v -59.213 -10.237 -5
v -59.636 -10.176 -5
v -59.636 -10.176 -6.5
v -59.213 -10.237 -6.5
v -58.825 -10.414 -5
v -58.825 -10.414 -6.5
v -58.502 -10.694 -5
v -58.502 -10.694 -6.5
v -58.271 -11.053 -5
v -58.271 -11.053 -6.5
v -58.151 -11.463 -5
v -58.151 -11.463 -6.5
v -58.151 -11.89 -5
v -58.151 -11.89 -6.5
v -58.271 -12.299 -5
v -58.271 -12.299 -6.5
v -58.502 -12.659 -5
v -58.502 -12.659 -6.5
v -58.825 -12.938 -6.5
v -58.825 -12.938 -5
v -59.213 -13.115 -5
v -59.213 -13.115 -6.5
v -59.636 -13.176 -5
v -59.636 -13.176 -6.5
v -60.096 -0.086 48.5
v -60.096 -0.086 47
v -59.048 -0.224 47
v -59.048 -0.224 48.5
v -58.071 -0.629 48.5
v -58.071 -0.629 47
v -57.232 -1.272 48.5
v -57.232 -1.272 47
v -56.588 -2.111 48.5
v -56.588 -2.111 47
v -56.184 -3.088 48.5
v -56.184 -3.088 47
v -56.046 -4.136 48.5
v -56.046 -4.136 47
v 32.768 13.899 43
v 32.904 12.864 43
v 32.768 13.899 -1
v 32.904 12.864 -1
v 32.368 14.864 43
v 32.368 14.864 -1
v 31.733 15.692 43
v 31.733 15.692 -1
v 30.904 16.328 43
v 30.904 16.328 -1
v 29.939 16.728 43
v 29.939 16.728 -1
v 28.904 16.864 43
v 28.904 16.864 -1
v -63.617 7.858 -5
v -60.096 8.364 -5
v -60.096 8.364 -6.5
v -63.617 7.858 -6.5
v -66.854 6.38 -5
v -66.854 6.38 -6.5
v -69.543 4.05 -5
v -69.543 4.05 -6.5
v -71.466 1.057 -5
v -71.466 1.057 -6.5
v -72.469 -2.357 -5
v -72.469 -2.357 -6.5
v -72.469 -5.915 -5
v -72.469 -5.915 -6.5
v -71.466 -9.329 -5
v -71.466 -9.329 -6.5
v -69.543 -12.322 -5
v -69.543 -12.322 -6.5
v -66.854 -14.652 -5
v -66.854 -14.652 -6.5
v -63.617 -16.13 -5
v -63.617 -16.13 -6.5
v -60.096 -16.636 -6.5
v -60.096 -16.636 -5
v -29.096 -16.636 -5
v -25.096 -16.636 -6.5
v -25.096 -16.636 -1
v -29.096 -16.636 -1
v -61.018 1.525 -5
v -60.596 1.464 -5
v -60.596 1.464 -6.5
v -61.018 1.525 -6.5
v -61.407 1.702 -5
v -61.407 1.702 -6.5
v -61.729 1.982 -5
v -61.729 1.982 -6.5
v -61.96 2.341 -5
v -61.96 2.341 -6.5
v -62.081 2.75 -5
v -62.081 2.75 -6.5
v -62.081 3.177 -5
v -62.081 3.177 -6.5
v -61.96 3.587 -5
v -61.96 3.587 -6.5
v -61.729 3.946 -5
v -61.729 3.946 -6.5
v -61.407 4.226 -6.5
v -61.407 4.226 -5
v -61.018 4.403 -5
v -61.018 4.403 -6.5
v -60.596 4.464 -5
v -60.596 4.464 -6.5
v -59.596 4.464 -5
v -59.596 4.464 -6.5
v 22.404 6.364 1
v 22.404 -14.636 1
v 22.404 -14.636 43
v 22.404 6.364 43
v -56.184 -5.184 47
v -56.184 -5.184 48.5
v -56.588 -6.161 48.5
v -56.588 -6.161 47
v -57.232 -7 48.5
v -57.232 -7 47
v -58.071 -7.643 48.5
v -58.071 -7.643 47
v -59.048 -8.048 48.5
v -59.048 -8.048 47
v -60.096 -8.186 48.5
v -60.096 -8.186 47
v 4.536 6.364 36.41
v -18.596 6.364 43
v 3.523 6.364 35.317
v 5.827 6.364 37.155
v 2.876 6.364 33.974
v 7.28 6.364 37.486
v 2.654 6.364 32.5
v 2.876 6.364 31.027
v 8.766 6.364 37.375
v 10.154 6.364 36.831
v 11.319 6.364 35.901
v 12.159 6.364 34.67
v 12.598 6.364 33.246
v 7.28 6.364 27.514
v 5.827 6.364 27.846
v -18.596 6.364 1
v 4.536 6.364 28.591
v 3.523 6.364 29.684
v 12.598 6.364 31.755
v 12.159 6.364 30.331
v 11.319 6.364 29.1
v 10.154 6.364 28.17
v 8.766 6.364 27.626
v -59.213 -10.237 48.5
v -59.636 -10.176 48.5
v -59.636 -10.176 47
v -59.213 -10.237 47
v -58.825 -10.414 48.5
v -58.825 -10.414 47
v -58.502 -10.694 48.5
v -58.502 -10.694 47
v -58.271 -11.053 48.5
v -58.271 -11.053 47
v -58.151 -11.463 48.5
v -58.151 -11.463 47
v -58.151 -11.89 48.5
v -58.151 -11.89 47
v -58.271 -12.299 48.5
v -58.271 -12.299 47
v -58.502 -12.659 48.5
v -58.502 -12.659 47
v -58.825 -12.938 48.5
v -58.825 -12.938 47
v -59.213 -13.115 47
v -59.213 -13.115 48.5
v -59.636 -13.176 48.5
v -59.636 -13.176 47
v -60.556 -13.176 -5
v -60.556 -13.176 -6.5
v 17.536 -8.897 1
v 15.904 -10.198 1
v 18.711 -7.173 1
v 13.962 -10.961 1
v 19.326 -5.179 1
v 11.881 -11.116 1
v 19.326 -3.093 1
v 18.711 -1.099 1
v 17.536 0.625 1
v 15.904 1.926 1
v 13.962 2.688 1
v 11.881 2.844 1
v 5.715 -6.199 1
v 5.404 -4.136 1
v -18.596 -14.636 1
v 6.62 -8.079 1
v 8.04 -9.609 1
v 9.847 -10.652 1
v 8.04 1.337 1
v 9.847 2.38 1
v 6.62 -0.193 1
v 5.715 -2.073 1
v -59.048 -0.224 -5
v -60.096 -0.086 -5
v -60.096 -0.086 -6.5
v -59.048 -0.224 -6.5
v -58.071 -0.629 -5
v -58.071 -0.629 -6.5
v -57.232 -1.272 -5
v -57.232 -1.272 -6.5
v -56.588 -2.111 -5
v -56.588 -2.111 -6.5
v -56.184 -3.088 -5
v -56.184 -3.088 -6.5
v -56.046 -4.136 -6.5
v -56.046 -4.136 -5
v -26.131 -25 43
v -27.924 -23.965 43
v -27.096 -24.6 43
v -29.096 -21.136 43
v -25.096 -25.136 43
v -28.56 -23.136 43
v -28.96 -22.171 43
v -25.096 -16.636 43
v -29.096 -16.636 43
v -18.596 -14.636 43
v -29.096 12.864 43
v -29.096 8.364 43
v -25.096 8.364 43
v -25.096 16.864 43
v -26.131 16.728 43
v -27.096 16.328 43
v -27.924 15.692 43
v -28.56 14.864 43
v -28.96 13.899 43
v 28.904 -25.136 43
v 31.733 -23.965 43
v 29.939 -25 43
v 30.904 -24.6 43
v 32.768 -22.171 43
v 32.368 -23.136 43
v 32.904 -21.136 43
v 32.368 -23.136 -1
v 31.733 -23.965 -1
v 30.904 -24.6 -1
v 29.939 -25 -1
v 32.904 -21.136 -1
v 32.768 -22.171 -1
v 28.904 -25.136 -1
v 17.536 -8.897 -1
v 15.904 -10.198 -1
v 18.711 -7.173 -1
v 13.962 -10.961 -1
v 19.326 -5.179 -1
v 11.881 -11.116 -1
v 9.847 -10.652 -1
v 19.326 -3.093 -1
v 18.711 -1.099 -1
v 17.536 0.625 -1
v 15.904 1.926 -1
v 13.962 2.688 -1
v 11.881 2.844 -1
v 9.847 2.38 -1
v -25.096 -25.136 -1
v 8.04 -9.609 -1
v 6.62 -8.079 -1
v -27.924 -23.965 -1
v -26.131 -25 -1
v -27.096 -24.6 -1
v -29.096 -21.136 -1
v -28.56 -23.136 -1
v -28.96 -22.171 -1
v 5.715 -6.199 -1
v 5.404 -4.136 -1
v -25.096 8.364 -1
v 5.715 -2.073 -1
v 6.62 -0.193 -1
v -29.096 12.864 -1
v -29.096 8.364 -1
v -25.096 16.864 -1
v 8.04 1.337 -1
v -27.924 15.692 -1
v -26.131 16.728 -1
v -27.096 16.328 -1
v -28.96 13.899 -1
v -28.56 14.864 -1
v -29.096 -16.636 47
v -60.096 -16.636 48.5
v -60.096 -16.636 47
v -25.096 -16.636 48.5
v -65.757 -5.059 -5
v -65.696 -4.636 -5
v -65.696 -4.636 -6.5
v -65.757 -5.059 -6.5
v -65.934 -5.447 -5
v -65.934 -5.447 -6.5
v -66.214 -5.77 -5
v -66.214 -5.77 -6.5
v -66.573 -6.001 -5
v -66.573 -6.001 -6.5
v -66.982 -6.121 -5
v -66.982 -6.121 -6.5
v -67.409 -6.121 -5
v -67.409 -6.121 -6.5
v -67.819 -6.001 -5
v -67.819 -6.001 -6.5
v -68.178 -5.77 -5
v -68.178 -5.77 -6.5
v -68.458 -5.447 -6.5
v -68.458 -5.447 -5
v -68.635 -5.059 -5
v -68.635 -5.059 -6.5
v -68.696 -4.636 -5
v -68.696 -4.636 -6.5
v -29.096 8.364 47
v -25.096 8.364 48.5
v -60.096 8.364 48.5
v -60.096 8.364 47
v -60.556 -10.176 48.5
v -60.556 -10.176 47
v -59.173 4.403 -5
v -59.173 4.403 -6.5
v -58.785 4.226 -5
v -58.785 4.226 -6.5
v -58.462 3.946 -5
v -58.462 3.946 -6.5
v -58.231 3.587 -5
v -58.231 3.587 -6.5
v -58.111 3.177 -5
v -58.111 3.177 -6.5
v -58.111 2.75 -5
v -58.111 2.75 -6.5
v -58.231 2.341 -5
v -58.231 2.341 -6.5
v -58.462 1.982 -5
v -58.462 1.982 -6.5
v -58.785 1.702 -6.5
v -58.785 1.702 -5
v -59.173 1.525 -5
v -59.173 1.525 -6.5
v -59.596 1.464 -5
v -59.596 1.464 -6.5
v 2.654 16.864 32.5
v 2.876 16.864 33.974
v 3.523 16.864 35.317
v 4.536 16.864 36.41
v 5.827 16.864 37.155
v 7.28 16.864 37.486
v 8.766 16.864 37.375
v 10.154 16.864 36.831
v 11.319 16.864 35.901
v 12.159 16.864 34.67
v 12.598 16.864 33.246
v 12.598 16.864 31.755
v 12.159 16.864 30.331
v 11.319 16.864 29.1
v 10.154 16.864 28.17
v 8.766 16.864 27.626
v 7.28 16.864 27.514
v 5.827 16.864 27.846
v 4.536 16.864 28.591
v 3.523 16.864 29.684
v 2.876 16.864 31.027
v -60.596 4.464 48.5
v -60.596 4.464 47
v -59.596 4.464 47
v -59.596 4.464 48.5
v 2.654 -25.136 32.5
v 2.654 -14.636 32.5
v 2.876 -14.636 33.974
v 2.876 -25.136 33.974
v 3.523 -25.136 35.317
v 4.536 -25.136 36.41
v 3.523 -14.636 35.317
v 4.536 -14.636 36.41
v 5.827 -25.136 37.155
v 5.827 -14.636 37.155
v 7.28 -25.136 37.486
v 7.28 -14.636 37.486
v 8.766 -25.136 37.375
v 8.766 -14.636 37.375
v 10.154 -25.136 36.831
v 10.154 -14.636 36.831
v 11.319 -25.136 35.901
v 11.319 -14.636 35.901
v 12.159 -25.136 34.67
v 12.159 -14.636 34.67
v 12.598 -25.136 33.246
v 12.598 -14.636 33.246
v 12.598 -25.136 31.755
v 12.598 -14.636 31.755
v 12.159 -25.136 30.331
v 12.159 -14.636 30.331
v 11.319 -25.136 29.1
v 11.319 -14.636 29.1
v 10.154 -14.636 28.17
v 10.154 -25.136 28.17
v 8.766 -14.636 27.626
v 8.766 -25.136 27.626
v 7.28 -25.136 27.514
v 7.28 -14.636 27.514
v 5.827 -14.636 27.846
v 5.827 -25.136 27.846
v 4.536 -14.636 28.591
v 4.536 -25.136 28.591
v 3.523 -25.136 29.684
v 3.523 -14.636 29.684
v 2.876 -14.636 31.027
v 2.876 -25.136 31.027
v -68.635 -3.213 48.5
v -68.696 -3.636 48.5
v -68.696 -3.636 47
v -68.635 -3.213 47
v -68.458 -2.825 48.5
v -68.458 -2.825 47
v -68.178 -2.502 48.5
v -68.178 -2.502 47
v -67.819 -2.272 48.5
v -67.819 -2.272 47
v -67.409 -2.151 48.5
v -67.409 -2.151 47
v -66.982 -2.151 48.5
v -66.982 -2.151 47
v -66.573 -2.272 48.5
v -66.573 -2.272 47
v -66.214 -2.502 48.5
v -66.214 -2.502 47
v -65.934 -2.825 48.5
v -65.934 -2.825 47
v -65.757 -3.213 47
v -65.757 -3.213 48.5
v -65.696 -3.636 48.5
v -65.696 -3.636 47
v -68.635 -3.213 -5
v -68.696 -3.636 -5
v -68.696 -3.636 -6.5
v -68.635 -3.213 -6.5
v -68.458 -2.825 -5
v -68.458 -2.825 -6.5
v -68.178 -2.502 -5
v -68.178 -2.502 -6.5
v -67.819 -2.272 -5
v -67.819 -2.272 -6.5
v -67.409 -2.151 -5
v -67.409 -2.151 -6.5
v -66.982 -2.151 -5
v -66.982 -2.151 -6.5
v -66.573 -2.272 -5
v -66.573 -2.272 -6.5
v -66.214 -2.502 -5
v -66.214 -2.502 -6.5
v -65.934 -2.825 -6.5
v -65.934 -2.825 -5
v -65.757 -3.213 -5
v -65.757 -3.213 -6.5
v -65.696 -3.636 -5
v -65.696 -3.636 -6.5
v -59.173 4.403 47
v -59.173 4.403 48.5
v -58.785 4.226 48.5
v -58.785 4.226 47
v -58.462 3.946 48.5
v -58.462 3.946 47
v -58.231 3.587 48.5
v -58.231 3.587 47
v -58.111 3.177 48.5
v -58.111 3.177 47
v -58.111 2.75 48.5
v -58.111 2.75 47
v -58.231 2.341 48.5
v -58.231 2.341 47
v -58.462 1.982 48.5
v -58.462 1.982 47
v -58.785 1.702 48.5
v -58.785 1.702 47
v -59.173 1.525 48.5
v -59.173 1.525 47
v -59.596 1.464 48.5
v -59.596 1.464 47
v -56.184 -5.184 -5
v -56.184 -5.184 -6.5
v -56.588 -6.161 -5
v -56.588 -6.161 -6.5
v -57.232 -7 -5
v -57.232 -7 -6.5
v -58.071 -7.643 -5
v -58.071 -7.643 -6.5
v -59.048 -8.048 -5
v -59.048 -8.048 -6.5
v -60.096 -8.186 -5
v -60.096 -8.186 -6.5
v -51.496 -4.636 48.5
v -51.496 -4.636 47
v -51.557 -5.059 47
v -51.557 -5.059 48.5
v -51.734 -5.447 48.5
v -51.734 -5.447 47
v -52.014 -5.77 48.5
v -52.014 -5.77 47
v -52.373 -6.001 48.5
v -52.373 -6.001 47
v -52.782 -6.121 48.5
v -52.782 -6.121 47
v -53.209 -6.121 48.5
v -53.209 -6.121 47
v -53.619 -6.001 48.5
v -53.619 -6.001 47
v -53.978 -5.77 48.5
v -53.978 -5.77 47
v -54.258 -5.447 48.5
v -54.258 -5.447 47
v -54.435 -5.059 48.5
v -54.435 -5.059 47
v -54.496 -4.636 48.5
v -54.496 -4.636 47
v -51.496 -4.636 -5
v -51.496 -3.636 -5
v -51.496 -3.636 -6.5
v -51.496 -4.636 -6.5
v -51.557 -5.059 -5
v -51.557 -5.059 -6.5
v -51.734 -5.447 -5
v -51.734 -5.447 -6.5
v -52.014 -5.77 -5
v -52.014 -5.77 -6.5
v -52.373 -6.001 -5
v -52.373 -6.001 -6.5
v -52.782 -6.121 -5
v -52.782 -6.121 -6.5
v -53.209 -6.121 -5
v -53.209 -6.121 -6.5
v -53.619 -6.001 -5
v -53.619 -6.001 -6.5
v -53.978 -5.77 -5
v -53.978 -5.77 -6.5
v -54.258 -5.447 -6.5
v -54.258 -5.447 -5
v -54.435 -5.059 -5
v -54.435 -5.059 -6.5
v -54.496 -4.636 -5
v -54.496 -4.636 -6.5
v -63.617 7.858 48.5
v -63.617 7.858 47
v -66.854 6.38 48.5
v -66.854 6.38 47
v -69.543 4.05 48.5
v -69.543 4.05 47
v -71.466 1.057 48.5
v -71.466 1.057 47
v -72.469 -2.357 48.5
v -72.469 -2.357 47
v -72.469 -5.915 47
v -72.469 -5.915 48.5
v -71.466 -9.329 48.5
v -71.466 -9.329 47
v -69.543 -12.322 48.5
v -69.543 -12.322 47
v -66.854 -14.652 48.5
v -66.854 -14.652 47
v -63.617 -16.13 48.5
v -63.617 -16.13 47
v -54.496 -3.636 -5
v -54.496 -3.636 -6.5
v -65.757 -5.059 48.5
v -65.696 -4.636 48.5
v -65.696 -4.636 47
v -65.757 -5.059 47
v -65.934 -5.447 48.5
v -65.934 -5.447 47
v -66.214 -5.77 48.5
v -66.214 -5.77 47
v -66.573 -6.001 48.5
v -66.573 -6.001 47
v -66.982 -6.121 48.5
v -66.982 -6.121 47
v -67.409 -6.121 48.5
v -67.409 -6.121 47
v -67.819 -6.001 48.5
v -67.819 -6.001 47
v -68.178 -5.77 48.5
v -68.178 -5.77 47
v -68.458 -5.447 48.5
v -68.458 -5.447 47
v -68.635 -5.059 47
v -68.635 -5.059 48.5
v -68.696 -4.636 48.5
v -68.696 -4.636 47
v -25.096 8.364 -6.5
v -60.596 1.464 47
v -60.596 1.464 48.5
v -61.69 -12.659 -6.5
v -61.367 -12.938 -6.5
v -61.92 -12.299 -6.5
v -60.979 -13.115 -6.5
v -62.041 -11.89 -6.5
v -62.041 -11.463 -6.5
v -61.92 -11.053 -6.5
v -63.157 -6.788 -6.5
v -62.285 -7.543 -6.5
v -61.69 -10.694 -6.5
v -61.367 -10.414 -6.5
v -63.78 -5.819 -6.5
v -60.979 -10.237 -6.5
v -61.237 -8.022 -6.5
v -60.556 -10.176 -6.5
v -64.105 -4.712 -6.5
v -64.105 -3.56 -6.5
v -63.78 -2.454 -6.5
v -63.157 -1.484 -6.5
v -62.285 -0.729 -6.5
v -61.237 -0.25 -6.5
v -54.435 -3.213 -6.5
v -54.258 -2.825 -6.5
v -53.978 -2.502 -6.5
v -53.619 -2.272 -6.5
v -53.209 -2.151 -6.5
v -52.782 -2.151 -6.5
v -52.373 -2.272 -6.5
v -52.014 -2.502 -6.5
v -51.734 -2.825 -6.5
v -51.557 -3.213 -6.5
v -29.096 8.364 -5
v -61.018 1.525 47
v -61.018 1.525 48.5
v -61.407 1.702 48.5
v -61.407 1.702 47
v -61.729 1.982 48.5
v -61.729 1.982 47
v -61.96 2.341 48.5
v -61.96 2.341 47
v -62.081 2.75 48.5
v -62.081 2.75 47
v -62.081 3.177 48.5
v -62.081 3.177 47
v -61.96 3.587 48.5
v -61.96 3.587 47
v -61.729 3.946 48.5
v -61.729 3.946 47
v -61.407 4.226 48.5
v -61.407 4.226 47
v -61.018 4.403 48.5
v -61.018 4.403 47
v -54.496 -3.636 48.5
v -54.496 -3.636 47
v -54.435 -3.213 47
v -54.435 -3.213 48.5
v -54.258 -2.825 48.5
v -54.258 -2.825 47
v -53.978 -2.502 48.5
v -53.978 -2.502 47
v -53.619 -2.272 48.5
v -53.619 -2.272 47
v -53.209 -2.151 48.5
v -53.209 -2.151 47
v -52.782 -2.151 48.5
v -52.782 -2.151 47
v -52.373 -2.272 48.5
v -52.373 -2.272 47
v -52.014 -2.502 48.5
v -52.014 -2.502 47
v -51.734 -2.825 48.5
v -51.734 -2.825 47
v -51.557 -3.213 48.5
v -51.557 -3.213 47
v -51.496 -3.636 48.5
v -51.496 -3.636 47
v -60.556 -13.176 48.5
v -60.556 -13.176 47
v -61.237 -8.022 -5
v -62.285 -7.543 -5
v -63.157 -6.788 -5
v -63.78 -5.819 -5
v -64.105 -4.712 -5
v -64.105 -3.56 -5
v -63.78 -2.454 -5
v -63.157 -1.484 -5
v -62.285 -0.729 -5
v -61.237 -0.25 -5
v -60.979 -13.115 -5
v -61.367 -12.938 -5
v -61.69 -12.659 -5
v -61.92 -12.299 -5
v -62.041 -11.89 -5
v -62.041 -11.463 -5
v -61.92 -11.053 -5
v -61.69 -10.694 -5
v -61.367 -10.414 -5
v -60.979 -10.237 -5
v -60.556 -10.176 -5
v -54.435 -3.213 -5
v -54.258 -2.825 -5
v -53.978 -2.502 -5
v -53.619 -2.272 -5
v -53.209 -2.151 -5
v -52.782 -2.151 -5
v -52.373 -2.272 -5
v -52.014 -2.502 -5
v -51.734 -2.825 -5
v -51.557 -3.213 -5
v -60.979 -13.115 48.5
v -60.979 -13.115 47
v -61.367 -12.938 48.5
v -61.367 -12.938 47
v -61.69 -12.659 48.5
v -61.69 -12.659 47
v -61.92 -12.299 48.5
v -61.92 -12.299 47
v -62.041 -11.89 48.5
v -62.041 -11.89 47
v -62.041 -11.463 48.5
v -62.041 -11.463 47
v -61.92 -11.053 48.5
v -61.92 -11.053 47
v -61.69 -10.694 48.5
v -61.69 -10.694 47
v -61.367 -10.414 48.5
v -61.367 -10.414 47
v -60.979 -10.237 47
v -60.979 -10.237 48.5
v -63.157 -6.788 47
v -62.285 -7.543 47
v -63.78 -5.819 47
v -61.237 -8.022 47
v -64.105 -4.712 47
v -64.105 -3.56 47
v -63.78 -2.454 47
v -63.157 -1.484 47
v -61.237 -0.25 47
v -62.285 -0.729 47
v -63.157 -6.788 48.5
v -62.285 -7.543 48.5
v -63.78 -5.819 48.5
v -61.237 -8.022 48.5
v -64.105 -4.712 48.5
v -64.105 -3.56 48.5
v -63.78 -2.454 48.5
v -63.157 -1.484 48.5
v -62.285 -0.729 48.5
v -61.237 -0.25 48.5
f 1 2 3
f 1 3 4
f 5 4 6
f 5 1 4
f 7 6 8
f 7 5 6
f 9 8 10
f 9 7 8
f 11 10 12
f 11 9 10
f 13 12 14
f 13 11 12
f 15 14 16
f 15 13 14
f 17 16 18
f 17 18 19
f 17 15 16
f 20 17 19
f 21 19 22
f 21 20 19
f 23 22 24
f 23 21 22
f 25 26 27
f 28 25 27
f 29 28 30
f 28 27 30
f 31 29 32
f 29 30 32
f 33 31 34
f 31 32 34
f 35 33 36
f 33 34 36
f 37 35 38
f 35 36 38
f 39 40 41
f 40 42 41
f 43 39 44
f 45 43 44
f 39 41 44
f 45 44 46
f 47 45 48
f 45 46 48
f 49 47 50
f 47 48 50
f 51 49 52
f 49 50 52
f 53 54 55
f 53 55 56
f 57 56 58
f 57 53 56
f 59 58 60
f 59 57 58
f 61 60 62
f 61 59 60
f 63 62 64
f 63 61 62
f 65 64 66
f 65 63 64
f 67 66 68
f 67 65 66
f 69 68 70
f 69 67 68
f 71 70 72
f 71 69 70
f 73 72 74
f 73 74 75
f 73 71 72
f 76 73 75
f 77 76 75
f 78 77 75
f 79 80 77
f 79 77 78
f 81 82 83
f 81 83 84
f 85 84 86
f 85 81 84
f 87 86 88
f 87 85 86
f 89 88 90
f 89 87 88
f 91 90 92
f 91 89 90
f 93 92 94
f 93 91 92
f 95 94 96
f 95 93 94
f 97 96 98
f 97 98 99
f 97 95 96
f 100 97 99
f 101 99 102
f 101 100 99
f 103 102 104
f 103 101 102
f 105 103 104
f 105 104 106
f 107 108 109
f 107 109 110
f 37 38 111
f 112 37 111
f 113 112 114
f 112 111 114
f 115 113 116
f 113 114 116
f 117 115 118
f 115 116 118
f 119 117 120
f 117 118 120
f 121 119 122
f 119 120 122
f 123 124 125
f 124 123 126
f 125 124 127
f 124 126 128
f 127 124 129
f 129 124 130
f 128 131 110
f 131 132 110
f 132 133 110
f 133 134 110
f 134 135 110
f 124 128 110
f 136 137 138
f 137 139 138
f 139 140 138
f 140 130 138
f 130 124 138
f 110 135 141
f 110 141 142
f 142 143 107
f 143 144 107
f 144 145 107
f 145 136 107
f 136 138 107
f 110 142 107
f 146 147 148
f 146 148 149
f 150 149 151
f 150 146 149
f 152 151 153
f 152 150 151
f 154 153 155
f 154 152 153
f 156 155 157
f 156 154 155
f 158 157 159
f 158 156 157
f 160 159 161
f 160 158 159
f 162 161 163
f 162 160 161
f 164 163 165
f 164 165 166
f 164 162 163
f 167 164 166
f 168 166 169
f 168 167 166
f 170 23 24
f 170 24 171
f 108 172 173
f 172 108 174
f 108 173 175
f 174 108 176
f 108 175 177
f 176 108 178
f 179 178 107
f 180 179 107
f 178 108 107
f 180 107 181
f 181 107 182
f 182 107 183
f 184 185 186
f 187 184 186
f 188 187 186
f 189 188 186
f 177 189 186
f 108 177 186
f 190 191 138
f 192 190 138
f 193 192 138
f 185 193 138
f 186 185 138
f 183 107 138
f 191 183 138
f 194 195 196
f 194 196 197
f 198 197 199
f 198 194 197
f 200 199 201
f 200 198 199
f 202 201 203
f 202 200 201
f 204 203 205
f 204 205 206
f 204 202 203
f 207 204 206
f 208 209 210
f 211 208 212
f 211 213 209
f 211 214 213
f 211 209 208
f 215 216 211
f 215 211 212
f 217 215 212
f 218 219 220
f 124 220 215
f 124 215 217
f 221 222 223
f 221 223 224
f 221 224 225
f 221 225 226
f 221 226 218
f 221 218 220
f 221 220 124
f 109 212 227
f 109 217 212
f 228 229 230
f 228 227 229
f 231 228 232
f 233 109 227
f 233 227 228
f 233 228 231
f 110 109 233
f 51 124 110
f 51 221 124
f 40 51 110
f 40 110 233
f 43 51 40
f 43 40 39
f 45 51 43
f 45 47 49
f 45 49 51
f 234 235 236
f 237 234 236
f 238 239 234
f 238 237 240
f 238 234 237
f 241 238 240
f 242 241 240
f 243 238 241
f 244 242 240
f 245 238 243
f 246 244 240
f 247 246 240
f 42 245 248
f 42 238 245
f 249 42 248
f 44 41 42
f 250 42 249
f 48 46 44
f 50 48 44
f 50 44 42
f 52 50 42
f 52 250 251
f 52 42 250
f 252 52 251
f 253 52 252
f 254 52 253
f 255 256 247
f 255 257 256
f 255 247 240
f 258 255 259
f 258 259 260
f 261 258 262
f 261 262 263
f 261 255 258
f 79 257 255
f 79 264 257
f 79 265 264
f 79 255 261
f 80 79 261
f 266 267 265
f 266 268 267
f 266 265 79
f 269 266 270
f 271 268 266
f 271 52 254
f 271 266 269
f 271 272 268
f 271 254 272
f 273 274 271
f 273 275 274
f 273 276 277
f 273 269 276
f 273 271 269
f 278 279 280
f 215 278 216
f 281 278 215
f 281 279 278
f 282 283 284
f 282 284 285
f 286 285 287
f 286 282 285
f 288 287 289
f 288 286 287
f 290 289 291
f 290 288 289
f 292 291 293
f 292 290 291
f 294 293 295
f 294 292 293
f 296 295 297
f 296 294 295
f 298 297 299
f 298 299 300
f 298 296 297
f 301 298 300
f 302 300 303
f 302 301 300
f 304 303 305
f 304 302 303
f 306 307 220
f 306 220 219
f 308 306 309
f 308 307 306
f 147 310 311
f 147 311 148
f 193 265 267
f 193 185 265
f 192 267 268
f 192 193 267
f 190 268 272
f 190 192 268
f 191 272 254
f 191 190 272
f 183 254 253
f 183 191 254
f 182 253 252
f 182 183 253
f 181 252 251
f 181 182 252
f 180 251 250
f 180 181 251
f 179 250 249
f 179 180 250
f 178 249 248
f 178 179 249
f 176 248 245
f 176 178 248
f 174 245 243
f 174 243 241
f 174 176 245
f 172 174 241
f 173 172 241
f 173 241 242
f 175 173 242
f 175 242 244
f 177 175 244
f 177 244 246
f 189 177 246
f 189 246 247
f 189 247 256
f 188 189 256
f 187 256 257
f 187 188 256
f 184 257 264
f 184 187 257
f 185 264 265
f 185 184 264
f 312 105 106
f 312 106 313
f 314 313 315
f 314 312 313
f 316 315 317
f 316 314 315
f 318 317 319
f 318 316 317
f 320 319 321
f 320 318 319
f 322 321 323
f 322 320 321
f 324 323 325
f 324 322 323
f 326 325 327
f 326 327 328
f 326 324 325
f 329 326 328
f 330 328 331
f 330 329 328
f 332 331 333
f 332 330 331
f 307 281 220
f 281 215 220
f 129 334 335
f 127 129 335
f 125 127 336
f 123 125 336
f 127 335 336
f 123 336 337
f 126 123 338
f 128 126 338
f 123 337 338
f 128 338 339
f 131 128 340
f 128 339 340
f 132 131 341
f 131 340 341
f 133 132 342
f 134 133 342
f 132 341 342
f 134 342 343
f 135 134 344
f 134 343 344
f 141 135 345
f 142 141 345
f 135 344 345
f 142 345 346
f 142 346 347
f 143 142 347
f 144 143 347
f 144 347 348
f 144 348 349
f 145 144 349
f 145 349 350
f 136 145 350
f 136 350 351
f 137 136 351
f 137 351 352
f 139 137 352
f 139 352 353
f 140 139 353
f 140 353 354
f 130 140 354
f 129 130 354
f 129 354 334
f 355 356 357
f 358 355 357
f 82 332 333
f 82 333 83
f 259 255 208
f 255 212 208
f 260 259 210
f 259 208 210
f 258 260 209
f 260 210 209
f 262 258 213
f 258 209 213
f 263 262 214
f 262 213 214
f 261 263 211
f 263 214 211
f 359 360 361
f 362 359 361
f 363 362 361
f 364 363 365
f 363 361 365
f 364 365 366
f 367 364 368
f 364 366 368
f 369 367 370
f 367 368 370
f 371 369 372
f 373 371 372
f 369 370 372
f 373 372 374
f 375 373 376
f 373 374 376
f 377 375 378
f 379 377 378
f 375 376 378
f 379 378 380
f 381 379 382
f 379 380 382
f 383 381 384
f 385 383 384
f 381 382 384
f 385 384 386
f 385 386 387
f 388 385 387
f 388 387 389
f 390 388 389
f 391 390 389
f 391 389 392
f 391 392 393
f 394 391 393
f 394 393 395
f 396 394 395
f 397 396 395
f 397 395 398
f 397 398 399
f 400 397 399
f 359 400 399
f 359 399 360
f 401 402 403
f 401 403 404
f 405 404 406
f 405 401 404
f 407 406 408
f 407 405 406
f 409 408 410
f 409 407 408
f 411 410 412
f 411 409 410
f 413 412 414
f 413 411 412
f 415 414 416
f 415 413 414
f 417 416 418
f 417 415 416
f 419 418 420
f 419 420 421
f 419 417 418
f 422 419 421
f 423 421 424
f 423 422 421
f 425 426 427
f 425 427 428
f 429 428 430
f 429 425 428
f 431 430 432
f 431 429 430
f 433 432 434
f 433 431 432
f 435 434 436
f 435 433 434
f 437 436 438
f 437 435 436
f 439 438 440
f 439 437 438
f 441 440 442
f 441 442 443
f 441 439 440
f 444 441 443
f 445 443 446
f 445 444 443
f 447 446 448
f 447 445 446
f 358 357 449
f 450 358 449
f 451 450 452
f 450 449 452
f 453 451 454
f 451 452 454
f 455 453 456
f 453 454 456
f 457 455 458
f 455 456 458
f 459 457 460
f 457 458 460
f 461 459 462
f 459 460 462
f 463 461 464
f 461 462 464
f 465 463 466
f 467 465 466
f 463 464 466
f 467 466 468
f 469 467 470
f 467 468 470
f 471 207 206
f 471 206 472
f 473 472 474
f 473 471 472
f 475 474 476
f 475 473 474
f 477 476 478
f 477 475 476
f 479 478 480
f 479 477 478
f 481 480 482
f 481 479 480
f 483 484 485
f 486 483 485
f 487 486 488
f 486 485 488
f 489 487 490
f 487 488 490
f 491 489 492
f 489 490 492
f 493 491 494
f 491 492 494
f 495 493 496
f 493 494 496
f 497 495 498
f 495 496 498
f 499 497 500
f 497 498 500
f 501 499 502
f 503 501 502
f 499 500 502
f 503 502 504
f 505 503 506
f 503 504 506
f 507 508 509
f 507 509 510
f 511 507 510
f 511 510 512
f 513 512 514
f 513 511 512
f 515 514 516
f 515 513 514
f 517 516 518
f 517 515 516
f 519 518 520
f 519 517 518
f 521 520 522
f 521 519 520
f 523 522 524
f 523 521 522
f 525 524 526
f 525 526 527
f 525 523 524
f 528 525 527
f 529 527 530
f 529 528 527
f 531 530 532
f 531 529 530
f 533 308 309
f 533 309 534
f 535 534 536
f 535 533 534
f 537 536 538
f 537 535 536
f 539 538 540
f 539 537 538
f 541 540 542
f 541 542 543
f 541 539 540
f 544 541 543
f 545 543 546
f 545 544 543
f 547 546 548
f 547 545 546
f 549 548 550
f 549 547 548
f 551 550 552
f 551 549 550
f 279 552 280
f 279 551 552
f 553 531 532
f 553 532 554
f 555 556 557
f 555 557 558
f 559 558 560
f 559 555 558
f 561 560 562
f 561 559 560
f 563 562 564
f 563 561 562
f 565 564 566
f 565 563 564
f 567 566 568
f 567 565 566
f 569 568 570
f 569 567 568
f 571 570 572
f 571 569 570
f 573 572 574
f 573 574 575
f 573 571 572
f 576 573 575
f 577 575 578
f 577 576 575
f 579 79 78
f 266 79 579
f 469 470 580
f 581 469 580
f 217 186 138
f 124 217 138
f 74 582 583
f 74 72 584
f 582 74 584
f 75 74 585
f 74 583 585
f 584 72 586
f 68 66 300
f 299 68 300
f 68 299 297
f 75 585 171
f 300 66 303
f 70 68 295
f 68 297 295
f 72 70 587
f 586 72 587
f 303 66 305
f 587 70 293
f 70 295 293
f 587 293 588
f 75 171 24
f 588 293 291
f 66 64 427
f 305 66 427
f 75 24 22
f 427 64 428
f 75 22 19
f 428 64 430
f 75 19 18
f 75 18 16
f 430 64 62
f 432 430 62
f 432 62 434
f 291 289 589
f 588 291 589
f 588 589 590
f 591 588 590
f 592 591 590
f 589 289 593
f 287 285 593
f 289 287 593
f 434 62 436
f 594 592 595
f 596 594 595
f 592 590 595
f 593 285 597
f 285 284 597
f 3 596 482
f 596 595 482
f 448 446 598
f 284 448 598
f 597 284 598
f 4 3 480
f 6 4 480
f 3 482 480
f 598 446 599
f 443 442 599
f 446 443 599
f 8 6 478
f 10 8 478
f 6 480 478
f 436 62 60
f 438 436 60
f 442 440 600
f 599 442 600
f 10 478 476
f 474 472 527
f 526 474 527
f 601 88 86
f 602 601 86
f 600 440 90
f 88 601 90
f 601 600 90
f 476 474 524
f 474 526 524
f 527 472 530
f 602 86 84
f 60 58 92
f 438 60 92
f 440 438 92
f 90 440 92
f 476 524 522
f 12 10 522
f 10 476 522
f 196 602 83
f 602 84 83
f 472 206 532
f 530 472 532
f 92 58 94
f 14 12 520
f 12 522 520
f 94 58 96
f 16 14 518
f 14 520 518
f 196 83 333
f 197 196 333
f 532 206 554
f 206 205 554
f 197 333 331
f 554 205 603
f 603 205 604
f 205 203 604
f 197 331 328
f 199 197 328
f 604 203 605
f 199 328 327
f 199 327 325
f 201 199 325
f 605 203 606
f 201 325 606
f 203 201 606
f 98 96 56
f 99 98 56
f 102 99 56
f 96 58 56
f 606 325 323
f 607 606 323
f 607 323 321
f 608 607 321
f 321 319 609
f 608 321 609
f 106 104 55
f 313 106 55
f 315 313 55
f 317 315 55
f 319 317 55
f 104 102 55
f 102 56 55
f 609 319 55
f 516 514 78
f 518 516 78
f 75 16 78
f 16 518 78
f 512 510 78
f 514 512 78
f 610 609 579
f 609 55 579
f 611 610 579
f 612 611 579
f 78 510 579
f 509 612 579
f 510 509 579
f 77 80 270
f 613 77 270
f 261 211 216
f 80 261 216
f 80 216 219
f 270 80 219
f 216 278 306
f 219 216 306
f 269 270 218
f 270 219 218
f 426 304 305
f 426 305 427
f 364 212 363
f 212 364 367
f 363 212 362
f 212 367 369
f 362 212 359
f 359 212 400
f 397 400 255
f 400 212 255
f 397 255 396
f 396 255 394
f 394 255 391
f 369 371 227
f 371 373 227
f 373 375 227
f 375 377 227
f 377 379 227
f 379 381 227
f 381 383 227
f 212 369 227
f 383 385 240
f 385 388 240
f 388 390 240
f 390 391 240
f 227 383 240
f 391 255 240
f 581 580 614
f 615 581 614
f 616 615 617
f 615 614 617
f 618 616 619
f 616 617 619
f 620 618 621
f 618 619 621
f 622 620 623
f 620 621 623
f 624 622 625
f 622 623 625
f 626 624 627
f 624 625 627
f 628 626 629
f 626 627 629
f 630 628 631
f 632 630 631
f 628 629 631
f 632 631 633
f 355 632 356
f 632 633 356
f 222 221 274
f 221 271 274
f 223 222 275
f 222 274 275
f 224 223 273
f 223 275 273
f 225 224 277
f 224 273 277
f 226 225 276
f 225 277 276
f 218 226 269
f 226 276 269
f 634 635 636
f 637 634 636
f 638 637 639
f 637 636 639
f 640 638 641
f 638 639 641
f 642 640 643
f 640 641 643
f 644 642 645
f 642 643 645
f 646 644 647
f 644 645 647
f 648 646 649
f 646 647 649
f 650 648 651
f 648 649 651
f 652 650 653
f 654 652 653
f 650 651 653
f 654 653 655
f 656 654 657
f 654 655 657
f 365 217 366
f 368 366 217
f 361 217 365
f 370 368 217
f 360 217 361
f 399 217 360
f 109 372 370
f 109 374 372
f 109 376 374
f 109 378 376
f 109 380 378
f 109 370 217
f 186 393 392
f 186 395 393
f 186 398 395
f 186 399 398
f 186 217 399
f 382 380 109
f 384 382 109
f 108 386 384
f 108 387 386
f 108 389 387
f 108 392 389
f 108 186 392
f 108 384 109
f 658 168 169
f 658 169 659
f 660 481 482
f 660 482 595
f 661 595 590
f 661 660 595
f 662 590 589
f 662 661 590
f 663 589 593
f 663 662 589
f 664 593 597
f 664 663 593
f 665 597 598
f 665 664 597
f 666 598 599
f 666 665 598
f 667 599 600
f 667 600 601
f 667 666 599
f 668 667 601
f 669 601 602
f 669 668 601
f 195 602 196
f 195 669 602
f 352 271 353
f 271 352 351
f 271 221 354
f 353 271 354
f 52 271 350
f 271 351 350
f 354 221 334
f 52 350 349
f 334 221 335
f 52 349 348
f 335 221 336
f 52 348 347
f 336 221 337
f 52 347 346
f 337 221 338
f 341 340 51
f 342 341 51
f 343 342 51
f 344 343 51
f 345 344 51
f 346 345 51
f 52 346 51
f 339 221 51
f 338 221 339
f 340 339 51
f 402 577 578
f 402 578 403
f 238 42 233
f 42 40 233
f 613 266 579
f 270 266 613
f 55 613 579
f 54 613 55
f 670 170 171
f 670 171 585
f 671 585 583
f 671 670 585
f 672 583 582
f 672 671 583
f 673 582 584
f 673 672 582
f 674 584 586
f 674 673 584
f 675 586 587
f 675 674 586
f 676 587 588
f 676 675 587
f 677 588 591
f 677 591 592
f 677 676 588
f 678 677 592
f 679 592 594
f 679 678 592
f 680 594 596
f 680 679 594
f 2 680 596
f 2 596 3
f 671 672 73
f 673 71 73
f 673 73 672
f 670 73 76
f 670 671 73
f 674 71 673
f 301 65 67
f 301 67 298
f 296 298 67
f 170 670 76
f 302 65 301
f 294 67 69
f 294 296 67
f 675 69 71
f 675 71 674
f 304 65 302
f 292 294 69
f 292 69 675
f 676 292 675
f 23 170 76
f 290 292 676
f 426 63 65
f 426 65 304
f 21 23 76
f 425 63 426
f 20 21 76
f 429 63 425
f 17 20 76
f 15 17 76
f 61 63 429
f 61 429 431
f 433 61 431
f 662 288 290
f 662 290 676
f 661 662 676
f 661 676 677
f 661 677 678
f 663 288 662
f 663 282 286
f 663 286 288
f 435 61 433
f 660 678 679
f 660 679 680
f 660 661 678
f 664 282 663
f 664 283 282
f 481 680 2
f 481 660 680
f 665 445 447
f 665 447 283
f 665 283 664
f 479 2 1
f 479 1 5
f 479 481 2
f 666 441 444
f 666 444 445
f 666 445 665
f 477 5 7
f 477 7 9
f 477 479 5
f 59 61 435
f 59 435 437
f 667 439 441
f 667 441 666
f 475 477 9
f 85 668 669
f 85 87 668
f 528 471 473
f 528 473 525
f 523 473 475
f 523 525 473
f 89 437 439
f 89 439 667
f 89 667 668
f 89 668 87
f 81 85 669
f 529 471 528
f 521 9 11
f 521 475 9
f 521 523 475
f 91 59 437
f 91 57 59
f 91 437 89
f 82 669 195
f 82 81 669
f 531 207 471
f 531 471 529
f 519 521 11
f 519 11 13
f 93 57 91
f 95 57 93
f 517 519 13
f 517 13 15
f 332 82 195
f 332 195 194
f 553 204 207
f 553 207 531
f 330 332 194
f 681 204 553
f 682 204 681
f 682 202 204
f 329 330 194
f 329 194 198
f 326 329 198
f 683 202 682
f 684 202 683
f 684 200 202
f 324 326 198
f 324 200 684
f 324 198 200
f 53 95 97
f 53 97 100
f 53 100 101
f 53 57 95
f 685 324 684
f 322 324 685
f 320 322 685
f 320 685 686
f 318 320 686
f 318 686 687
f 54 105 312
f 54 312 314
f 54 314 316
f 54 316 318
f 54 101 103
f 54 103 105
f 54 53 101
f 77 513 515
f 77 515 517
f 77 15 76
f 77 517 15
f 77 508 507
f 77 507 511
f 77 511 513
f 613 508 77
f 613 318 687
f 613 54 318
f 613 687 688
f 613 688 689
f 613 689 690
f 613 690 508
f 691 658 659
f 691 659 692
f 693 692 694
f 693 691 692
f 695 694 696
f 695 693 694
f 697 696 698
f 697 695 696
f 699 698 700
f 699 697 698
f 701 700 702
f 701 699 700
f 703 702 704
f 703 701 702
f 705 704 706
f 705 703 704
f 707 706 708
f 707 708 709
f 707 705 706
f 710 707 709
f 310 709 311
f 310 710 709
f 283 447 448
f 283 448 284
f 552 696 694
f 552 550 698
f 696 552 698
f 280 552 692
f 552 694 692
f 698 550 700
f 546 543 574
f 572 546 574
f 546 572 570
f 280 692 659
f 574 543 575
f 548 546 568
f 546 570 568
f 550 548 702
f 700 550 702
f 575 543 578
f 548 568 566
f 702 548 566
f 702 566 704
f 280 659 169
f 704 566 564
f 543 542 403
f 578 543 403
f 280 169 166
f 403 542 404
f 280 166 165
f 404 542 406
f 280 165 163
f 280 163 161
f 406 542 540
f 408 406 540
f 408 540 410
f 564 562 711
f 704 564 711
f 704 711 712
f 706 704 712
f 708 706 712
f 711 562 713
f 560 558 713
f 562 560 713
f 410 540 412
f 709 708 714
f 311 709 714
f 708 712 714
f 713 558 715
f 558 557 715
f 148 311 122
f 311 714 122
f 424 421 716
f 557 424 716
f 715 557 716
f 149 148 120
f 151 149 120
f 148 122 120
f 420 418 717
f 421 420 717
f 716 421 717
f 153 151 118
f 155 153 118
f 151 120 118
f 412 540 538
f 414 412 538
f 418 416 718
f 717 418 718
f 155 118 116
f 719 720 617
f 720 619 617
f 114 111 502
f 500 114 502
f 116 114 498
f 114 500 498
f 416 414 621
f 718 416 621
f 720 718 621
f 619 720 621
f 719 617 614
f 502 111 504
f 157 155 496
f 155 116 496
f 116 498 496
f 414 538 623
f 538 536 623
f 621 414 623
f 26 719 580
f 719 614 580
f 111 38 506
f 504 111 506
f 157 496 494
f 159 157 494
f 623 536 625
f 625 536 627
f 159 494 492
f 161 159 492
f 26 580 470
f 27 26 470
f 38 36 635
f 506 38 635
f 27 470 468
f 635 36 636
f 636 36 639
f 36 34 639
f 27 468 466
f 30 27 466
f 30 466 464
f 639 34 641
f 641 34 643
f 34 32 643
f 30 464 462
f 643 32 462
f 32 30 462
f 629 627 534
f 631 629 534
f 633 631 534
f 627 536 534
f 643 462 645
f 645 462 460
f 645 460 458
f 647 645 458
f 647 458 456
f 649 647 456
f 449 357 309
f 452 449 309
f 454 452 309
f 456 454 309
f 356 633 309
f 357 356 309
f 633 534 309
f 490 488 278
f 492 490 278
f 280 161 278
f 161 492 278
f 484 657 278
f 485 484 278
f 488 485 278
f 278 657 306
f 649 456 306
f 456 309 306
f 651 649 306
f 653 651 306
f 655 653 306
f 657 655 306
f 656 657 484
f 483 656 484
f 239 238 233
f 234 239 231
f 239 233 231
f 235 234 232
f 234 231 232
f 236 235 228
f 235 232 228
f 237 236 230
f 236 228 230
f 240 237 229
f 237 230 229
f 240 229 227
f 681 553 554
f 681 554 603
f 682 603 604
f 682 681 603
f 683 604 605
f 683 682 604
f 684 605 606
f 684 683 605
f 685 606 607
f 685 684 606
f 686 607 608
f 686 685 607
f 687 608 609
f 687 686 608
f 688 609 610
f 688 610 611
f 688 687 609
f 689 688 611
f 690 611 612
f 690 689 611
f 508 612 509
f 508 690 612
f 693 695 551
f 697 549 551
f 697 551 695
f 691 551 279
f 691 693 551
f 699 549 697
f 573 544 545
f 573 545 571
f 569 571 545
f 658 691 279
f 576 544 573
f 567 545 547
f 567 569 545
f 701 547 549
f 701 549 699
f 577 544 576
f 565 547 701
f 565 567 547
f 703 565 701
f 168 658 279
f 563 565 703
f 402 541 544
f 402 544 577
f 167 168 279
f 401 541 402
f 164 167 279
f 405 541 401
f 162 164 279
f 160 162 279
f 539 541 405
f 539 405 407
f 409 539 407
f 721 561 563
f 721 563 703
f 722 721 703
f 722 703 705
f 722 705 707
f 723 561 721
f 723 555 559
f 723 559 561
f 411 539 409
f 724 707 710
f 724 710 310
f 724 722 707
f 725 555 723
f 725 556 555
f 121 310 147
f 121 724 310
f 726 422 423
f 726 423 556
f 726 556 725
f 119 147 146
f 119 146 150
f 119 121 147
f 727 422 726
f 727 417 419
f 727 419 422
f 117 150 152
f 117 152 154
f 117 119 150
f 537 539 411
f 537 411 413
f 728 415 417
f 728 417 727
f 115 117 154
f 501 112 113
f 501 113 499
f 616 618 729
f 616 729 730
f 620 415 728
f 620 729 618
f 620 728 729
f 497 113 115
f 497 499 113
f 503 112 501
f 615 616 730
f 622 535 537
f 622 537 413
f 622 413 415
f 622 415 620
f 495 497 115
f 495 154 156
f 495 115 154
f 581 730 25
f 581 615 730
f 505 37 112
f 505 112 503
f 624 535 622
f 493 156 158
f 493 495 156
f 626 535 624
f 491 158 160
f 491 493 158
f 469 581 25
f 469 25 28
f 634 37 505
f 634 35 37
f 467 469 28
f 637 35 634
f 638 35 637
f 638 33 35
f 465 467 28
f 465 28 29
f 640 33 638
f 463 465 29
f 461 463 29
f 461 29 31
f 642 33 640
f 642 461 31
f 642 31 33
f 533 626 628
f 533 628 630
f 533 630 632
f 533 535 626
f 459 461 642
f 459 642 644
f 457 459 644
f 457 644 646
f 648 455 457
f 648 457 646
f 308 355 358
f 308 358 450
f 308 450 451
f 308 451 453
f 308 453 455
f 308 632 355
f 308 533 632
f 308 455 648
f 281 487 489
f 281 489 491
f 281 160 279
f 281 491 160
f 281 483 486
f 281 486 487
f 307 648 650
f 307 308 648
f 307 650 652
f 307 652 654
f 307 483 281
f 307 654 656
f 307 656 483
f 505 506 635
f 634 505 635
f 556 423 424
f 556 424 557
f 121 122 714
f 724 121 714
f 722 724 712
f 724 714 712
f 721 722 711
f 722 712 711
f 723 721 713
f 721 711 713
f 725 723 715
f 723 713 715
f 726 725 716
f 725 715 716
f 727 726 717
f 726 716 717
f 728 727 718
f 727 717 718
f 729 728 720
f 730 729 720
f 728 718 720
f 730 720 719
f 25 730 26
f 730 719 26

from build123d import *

# Parameters (mm, degrees)
SKETCH1_W           = 62
SKETCH1_H           = 42
SKETCH1_W_2         = 41
SKETCH1_H_2         = 21
BOSS_EXTRUDE1_DEPTH = 43
SKETCH2_W           = 4
SKETCH2_H           = 25
BOSS_EXTRUDE2_DEPTH = 4
SKETCH3_W           = 4
SKETCH3_H           = 25
BOSS_EXTRUDE6_DEPTH = 1.5
SKETCH3_8_W         = 4
SKETCH3_8_H         = 25
BOSS_EXTRUDE7_DEPTH = 53.5
CUT_EXTRUDE1_DEPTH  = 52
SKETCH_1_R          = 5
CUT_EXTRUDE_1_DEPTH = 42
EXTRUDE_1_DEPTH     = 1
SKETCH_2_3_R        = 7
EXTRUDE_2_DEPTH     = 1
FILLET_1_R          = 4
FILLET_2_R          = 4
FILLET_3_R          = 4
FILLET_4_R          = 4


with BuildPart() as part:
    # Sketch1 → Boss-Extrude1 (new body)
    with BuildSketch(Plane.XY):
        with Locations((1.904162196, -4.136072895)):
            Rectangle(SKETCH1_W, SKETCH1_H)
        with Locations((1.904162196, -4.136072895)):
            Rectangle(SKETCH1_W_2, SKETCH1_H_2, mode=Mode.SUBTRACT)
    extrude(amount=BOSS_EXTRUDE1_DEPTH)

    # Sketch2 → Boss-Extrude2 (add)
    with BuildSketch(Plane.XY.offset(43)):
        with Locations((-27.095837804, -4.136072895)):
            Rectangle(SKETCH2_W, SKETCH2_H)
    extrude(amount=BOSS_EXTRUDE2_DEPTH)

    # Sketch3 → Boss-Extrude6 (add)
    with BuildSketch(Plane.XY.offset(47)):
        with BuildLine():
            Line((-60.095837804, 4.463927105), (-60.095837804, 8.363927105))
            ThreePointArc((-60.095837804, 8.363927105), (-72.595837804, -4.136072895), (-60.095837804, -16.636072895))
            Line((-60.095837804, -16.636072895), (-60.095837804, -13.176248856))
            Line((-60.095837804, -13.176248856), (-60.555926168, -13.176248856))
            ThreePointArc((-60.555926168, -13.176248856), (-62.055926168, -11.676248856), (-60.555926168, -10.176248856))
            Line((-60.555926168, -10.176248856), (-60.095837804, -10.176248856))
            Line((-60.095837804, -10.176248856), (-60.095837804, -8.186072895))
            ThreePointArc((-60.095837804, -8.186072895), (-64.145837804, -4.136072895), (-60.095837804, -0.086072895))
            Line((-60.095837804, -0.086072895), (-60.095837804, 1.463927105))
            Line((-60.095837804, 1.463927105), (-60.595837804, 1.463927105))
            ThreePointArc((-60.595837804, 1.463927105), (-62.095837804, 2.963927105), (-60.595837804, 4.463927105))
            Line((-60.595837804, 4.463927105), (-60.095837804, 4.463927105))
        make_face()
        with BuildLine():
            ThreePointArc((-68.695837804, -3.636072895), (-67.195837804, -2.136072895), (-65.695837804, -3.636072895))
            Line((-65.695837804, -3.636072895), (-65.695837804, -4.636072895))
            ThreePointArc((-65.695837804, -4.636072895), (-67.195837804, -6.136072895), (-68.695837804, -4.636072895))
            Line((-68.695837804, -4.636072895), (-68.695837804, -3.636072895))
        make_face(mode=Mode.SUBTRACT)
        with BuildLine():
            Line((-29.095837804, -16.636072895), (-29.095837804, 8.363927105))
            Line((-29.095837804, 8.363927105), (-60.095837804, 8.363927105))
            Line((-60.095837804, 8.363927105), (-60.095837804, 4.463927105))
            Line((-60.095837804, 4.463927105), (-59.595837804, 4.463927105))
            ThreePointArc((-59.595837804, 4.463927105), (-58.095837804, 2.963927105), (-59.595837804, 1.463927105))
            Line((-59.595837804, 1.463927105), (-60.095837804, 1.463927105))
            Line((-60.095837804, 1.463927105), (-60.095837804, -0.086072895))
            ThreePointArc((-60.095837804, -0.086072895), (-57.23205534, -1.272290432), (-56.045837804, -4.136072895))
            ThreePointArc((-56.045837804, -4.136072895), (-57.23205534, -6.999855359), (-60.095837804, -8.186072895))
            Line((-60.095837804, -8.186072895), (-60.095837804, -10.176248856))
            Line((-60.095837804, -10.176248856), (-59.635749439, -10.176248856))
            ThreePointArc((-59.635749439, -10.176248856), (-58.135749439, -11.676248856), (-59.635749439, -13.176248856))
            Line((-59.635749439, -13.176248856), (-60.095837804, -13.176248856))
            Line((-60.095837804, -13.176248856), (-60.095837804, -16.636072895))
            Line((-60.095837804, -16.636072895), (-29.095837804, -16.636072895))
        make_face()
        with BuildLine():
            ThreePointArc((-54.495837804, -3.636072895), (-52.995837804, -2.136072895), (-51.495837804, -3.636072895))
            Line((-51.495837804, -3.636072895), (-51.495837804, -4.636072895))
            ThreePointArc((-51.495837804, -4.636072895), (-52.995837804, -6.136072895), (-54.495837804, -4.636072895))
            Line((-54.495837804, -4.636072895), (-54.495837804, -3.636072895))
        make_face(mode=Mode.SUBTRACT)
        with Locations((-27.095837804, -4.136072895)):
            Rectangle(SKETCH3_W, SKETCH3_H)
    extrude(amount=BOSS_EXTRUDE6_DEPTH)

    # Sketch3<8> → Boss-Extrude7 (add)
    with BuildSketch(Plane.XY.offset(47)):
        with BuildLine():
            Line((-60.095837804, 4.463927105), (-60.095837804, 8.363927105))
            ThreePointArc((-60.095837804, 8.363927105), (-72.595837804, -4.136072895), (-60.095837804, -16.636072895))
            Line((-60.095837804, -16.636072895), (-60.095837804, -13.176248856))
            Line((-60.095837804, -13.176248856), (-60.555926168, -13.176248856))
            ThreePointArc((-60.555926168, -13.176248856), (-62.055926168, -11.676248856), (-60.555926168, -10.176248856))
            Line((-60.555926168, -10.176248856), (-60.095837804, -10.176248856))
            Line((-60.095837804, -10.176248856), (-60.095837804, -8.186072895))
            ThreePointArc((-60.095837804, -8.186072895), (-64.145837804, -4.136072895), (-60.095837804, -0.086072895))
            Line((-60.095837804, -0.086072895), (-60.095837804, 1.463927105))
            Line((-60.095837804, 1.463927105), (-60.595837804, 1.463927105))
            ThreePointArc((-60.595837804, 1.463927105), (-62.095837804, 2.963927105), (-60.595837804, 4.463927105))
            Line((-60.595837804, 4.463927105), (-60.095837804, 4.463927105))
        make_face()
        with BuildLine():
            ThreePointArc((-68.695837804, -3.636072895), (-67.195837804, -2.136072895), (-65.695837804, -3.636072895))
            Line((-65.695837804, -3.636072895), (-65.695837804, -4.636072895))
            ThreePointArc((-65.695837804, -4.636072895), (-67.195837804, -6.136072895), (-68.695837804, -4.636072895))
            Line((-68.695837804, -4.636072895), (-68.695837804, -3.636072895))
        make_face(mode=Mode.SUBTRACT)
        with BuildLine():
            Line((-29.095837804, -16.636072895), (-29.095837804, 8.363927105))
            Line((-29.095837804, 8.363927105), (-60.095837804, 8.363927105))
            Line((-60.095837804, 8.363927105), (-60.095837804, 4.463927105))
            Line((-60.095837804, 4.463927105), (-59.595837804, 4.463927105))
            ThreePointArc((-59.595837804, 4.463927105), (-58.095837804, 2.963927105), (-59.595837804, 1.463927105))
            Line((-59.595837804, 1.463927105), (-60.095837804, 1.463927105))
            Line((-60.095837804, 1.463927105), (-60.095837804, -0.086072895))
            ThreePointArc((-60.095837804, -0.086072895), (-57.23205534, -1.272290432), (-56.045837804, -4.136072895))
            ThreePointArc((-56.045837804, -4.136072895), (-57.23205534, -6.999855359), (-60.095837804, -8.186072895))
            Line((-60.095837804, -8.186072895), (-60.095837804, -10.176248856))
            Line((-60.095837804, -10.176248856), (-59.635749439, -10.176248856))
            ThreePointArc((-59.635749439, -10.176248856), (-58.135749439, -11.676248856), (-59.635749439, -13.176248856))
            Line((-59.635749439, -13.176248856), (-60.095837804, -13.176248856))
            Line((-60.095837804, -13.176248856), (-60.095837804, -16.636072895))
            Line((-60.095837804, -16.636072895), (-29.095837804, -16.636072895))
        make_face()
        with BuildLine():
            ThreePointArc((-54.495837804, -3.636072895), (-52.995837804, -2.136072895), (-51.495837804, -3.636072895))
            Line((-51.495837804, -3.636072895), (-51.495837804, -4.636072895))
            ThreePointArc((-51.495837804, -4.636072895), (-52.995837804, -6.136072895), (-54.495837804, -4.636072895))
            Line((-54.495837804, -4.636072895), (-54.495837804, -3.636072895))
        make_face(mode=Mode.SUBTRACT)
        with Locations((-27.095837804, -4.136072895)):
            Rectangle(SKETCH3_8_W, SKETCH3_8_H)
    extrude(amount=-BOSS_EXTRUDE7_DEPTH)

    # Sketch3<11> → Cut-Extrude1 (cut)
    with BuildSketch(Plane.XY.offset(47)):
        with BuildLine():
            Line((-29.095837804, -16.636072895), (-29.095837804, 8.363927105))
            Line((-29.095837804, 8.363927105), (-60.095837804, 8.363927105))
            Line((-60.095837804, 8.363927105), (-60.095837804, 4.463927105))
            Line((-60.095837804, 4.463927105), (-59.595837804, 4.463927105))
            ThreePointArc((-59.595837804, 4.463927105), (-58.095837804, 2.963927105), (-59.595837804, 1.463927105))
            Line((-59.595837804, 1.463927105), (-60.095837804, 1.463927105))
            Line((-60.095837804, 1.463927105), (-60.095837804, -0.086072895))
            ThreePointArc((-60.095837804, -0.086072895), (-57.23205534, -1.272290432), (-56.045837804, -4.136072895))
            ThreePointArc((-56.045837804, -4.136072895), (-57.23205534, -6.999855359), (-60.095837804, -8.186072895))
            Line((-60.095837804, -8.186072895), (-60.095837804, -10.176248856))
            Line((-60.095837804, -10.176248856), (-59.635749439, -10.176248856))
            ThreePointArc((-59.635749439, -10.176248856), (-58.135749439, -11.676248856), (-59.635749439, -13.176248856))
            Line((-59.635749439, -13.176248856), (-60.095837804, -13.176248856))
            Line((-60.095837804, -13.176248856), (-60.095837804, -16.636072895))
            Line((-60.095837804, -16.636072895), (-29.095837804, -16.636072895))
        make_face()
        with BuildLine():
            ThreePointArc((-54.495837804, -3.636072895), (-52.995837804, -2.136072895), (-51.495837804, -3.636072895))
            Line((-51.495837804, -3.636072895), (-51.495837804, -4.636072895))
            ThreePointArc((-51.495837804, -4.636072895), (-52.995837804, -6.136072895), (-54.495837804, -4.636072895))
            Line((-54.495837804, -4.636072895), (-54.495837804, -3.636072895))
        make_face(mode=Mode.SUBTRACT)
        with BuildLine():
            Line((-60.095837804, 4.463927105), (-60.095837804, 8.363927105))
            ThreePointArc((-60.095837804, 8.363927105), (-72.595837804, -4.136072895), (-60.095837804, -16.636072895))
            Line((-60.095837804, -16.636072895), (-60.095837804, -13.176248856))
            Line((-60.095837804, -13.176248856), (-60.555926168, -13.176248856))
            ThreePointArc((-60.555926168, -13.176248856), (-62.055926168, -11.676248856), (-60.555926168, -10.176248856))
            Line((-60.555926168, -10.176248856), (-60.095837804, -10.176248856))
            Line((-60.095837804, -10.176248856), (-60.095837804, -8.186072895))
            ThreePointArc((-60.095837804, -8.186072895), (-64.145837804, -4.136072895), (-60.095837804, -0.086072895))
            Line((-60.095837804, -0.086072895), (-60.095837804, 1.463927105))
            Line((-60.095837804, 1.463927105), (-60.595837804, 1.463927105))
            ThreePointArc((-60.595837804, 1.463927105), (-62.095837804, 2.963927105), (-60.595837804, 4.463927105))
            Line((-60.595837804, 4.463927105), (-60.095837804, 4.463927105))
        make_face()
        with BuildLine():
            ThreePointArc((-68.695837804, -3.636072895), (-67.195837804, -2.136072895), (-65.695837804, -3.636072895))
            Line((-65.695837804, -3.636072895), (-65.695837804, -4.636072895))
            ThreePointArc((-65.695837804, -4.636072895), (-67.195837804, -6.136072895), (-68.695837804, -4.636072895))
            Line((-68.695837804, -4.636072895), (-68.695837804, -3.636072895))
        make_face(mode=Mode.SUBTRACT)
    extrude(amount=-CUT_EXTRUDE1_DEPTH, mode=Mode.SUBTRACT)

    # 草圖1 → 除料-伸長1 (cut)
    with BuildSketch(Plane(origin=(0, 16.863927105, 0), x_dir=(1, 0, 0), z_dir=(0, 1, 0))):
        with Locations(Location((7.653776732, -32.500385465, 0), (0, 0, 180))):
            Circle(SKETCH_1_R)
    extrude(amount=-CUT_EXTRUDE_1_DEPTH, mode=Mode.SUBTRACT)

    # 草圖2 → 填料-伸長1 (add)
    with BuildSketch(Plane(origin=(0, 0, 0), x_dir=(-1, 0, 0), z_dir=(0, 0, -1))):
        with BuildLine():
            Line((-22.404162196, 6.363927105), (-22.404162196, -4.136072895))
            Line((-22.404162196, -4.136072895), (-19.404162196, -4.136072895))
            ThreePointArc((-19.404162196, -4.136072895), (-12.404162196, 2.863927105), (-5.404162196, -4.136072895))
            Line((-5.404162196, -4.136072895), (18.595837804, -4.136072895))
            Line((18.595837804, -4.136072895), (18.595837804, 6.363927105))
            Line((18.595837804, 6.363927105), (-22.404162196, 6.363927105))
        make_face()
        with BuildLine():
            Line((-22.404162196, -4.136072895), (-22.404162196, -14.636072895))
            Line((-22.404162196, -14.636072895), (18.595837804, -14.636072895))
            Line((18.595837804, -14.636072895), (18.595837804, -4.136072895))
            Line((18.595837804, -4.136072895), (-5.404162196, -4.136072895))
            ThreePointArc((-5.404162196, -4.136072895), (-12.404162196, -11.136072895), (-19.404162196, -4.136072895))
            Line((-19.404162196, -4.136072895), (-22.404162196, -4.136072895))
        make_face()
    extrude(amount=-EXTRUDE_1_DEPTH)

    # 草圖2<3> → 填料-伸長2 (add)
    with BuildSketch(Plane(origin=(0, 0, 0), x_dir=(-1, 0, 0), z_dir=(0, 0, -1))):
        Polygon((29.095837804, 8.363927105), (29.095837804, 16.863927105), (-32.904162196, 16.863927105), (-32.904162196, -25.136072895), (29.095837804, -25.136072895), (29.095837804, -16.636072895), (25.095837804, -16.636072895), (25.095837804, 8.363927105), align=None)
        with Locations((-12.404162196, -4.136072895)):
            Circle(SKETCH_2_3_R, mode=Mode.SUBTRACT)
    extrude(amount=EXTRUDE_2_DEPTH)

    # 圓角1
    fillet_1_edges = [part.edges().sort_by_distance(p)[0] for p in [
        (32.904162196, -25.136072895, 21),
    ]]
    fillet(fillet_1_edges, radius=FILLET_1_R)

    # 圓角2
    fillet_2_edges = [part.edges().sort_by_distance(p)[0] for p in [
        (-29.095837804, -25.136072895, 21),
    ]]
    fillet(fillet_2_edges, radius=FILLET_2_R)

    # 圓角3
    fillet_3_edges = [part.edges().sort_by_distance(p)[0] for p in [
        (32.904162196, 16.863927105, 21),
    ]]
    fillet(fillet_3_edges, radius=FILLET_3_R)

    # 圓角4
    fillet_4_edges = [part.edges().sort_by_distance(p)[0] for p in [
        (-29.095837804, 16.863927105, 21),
    ]]
    fillet(fillet_4_edges, radius=FILLET_4_R)


solid = part.part
